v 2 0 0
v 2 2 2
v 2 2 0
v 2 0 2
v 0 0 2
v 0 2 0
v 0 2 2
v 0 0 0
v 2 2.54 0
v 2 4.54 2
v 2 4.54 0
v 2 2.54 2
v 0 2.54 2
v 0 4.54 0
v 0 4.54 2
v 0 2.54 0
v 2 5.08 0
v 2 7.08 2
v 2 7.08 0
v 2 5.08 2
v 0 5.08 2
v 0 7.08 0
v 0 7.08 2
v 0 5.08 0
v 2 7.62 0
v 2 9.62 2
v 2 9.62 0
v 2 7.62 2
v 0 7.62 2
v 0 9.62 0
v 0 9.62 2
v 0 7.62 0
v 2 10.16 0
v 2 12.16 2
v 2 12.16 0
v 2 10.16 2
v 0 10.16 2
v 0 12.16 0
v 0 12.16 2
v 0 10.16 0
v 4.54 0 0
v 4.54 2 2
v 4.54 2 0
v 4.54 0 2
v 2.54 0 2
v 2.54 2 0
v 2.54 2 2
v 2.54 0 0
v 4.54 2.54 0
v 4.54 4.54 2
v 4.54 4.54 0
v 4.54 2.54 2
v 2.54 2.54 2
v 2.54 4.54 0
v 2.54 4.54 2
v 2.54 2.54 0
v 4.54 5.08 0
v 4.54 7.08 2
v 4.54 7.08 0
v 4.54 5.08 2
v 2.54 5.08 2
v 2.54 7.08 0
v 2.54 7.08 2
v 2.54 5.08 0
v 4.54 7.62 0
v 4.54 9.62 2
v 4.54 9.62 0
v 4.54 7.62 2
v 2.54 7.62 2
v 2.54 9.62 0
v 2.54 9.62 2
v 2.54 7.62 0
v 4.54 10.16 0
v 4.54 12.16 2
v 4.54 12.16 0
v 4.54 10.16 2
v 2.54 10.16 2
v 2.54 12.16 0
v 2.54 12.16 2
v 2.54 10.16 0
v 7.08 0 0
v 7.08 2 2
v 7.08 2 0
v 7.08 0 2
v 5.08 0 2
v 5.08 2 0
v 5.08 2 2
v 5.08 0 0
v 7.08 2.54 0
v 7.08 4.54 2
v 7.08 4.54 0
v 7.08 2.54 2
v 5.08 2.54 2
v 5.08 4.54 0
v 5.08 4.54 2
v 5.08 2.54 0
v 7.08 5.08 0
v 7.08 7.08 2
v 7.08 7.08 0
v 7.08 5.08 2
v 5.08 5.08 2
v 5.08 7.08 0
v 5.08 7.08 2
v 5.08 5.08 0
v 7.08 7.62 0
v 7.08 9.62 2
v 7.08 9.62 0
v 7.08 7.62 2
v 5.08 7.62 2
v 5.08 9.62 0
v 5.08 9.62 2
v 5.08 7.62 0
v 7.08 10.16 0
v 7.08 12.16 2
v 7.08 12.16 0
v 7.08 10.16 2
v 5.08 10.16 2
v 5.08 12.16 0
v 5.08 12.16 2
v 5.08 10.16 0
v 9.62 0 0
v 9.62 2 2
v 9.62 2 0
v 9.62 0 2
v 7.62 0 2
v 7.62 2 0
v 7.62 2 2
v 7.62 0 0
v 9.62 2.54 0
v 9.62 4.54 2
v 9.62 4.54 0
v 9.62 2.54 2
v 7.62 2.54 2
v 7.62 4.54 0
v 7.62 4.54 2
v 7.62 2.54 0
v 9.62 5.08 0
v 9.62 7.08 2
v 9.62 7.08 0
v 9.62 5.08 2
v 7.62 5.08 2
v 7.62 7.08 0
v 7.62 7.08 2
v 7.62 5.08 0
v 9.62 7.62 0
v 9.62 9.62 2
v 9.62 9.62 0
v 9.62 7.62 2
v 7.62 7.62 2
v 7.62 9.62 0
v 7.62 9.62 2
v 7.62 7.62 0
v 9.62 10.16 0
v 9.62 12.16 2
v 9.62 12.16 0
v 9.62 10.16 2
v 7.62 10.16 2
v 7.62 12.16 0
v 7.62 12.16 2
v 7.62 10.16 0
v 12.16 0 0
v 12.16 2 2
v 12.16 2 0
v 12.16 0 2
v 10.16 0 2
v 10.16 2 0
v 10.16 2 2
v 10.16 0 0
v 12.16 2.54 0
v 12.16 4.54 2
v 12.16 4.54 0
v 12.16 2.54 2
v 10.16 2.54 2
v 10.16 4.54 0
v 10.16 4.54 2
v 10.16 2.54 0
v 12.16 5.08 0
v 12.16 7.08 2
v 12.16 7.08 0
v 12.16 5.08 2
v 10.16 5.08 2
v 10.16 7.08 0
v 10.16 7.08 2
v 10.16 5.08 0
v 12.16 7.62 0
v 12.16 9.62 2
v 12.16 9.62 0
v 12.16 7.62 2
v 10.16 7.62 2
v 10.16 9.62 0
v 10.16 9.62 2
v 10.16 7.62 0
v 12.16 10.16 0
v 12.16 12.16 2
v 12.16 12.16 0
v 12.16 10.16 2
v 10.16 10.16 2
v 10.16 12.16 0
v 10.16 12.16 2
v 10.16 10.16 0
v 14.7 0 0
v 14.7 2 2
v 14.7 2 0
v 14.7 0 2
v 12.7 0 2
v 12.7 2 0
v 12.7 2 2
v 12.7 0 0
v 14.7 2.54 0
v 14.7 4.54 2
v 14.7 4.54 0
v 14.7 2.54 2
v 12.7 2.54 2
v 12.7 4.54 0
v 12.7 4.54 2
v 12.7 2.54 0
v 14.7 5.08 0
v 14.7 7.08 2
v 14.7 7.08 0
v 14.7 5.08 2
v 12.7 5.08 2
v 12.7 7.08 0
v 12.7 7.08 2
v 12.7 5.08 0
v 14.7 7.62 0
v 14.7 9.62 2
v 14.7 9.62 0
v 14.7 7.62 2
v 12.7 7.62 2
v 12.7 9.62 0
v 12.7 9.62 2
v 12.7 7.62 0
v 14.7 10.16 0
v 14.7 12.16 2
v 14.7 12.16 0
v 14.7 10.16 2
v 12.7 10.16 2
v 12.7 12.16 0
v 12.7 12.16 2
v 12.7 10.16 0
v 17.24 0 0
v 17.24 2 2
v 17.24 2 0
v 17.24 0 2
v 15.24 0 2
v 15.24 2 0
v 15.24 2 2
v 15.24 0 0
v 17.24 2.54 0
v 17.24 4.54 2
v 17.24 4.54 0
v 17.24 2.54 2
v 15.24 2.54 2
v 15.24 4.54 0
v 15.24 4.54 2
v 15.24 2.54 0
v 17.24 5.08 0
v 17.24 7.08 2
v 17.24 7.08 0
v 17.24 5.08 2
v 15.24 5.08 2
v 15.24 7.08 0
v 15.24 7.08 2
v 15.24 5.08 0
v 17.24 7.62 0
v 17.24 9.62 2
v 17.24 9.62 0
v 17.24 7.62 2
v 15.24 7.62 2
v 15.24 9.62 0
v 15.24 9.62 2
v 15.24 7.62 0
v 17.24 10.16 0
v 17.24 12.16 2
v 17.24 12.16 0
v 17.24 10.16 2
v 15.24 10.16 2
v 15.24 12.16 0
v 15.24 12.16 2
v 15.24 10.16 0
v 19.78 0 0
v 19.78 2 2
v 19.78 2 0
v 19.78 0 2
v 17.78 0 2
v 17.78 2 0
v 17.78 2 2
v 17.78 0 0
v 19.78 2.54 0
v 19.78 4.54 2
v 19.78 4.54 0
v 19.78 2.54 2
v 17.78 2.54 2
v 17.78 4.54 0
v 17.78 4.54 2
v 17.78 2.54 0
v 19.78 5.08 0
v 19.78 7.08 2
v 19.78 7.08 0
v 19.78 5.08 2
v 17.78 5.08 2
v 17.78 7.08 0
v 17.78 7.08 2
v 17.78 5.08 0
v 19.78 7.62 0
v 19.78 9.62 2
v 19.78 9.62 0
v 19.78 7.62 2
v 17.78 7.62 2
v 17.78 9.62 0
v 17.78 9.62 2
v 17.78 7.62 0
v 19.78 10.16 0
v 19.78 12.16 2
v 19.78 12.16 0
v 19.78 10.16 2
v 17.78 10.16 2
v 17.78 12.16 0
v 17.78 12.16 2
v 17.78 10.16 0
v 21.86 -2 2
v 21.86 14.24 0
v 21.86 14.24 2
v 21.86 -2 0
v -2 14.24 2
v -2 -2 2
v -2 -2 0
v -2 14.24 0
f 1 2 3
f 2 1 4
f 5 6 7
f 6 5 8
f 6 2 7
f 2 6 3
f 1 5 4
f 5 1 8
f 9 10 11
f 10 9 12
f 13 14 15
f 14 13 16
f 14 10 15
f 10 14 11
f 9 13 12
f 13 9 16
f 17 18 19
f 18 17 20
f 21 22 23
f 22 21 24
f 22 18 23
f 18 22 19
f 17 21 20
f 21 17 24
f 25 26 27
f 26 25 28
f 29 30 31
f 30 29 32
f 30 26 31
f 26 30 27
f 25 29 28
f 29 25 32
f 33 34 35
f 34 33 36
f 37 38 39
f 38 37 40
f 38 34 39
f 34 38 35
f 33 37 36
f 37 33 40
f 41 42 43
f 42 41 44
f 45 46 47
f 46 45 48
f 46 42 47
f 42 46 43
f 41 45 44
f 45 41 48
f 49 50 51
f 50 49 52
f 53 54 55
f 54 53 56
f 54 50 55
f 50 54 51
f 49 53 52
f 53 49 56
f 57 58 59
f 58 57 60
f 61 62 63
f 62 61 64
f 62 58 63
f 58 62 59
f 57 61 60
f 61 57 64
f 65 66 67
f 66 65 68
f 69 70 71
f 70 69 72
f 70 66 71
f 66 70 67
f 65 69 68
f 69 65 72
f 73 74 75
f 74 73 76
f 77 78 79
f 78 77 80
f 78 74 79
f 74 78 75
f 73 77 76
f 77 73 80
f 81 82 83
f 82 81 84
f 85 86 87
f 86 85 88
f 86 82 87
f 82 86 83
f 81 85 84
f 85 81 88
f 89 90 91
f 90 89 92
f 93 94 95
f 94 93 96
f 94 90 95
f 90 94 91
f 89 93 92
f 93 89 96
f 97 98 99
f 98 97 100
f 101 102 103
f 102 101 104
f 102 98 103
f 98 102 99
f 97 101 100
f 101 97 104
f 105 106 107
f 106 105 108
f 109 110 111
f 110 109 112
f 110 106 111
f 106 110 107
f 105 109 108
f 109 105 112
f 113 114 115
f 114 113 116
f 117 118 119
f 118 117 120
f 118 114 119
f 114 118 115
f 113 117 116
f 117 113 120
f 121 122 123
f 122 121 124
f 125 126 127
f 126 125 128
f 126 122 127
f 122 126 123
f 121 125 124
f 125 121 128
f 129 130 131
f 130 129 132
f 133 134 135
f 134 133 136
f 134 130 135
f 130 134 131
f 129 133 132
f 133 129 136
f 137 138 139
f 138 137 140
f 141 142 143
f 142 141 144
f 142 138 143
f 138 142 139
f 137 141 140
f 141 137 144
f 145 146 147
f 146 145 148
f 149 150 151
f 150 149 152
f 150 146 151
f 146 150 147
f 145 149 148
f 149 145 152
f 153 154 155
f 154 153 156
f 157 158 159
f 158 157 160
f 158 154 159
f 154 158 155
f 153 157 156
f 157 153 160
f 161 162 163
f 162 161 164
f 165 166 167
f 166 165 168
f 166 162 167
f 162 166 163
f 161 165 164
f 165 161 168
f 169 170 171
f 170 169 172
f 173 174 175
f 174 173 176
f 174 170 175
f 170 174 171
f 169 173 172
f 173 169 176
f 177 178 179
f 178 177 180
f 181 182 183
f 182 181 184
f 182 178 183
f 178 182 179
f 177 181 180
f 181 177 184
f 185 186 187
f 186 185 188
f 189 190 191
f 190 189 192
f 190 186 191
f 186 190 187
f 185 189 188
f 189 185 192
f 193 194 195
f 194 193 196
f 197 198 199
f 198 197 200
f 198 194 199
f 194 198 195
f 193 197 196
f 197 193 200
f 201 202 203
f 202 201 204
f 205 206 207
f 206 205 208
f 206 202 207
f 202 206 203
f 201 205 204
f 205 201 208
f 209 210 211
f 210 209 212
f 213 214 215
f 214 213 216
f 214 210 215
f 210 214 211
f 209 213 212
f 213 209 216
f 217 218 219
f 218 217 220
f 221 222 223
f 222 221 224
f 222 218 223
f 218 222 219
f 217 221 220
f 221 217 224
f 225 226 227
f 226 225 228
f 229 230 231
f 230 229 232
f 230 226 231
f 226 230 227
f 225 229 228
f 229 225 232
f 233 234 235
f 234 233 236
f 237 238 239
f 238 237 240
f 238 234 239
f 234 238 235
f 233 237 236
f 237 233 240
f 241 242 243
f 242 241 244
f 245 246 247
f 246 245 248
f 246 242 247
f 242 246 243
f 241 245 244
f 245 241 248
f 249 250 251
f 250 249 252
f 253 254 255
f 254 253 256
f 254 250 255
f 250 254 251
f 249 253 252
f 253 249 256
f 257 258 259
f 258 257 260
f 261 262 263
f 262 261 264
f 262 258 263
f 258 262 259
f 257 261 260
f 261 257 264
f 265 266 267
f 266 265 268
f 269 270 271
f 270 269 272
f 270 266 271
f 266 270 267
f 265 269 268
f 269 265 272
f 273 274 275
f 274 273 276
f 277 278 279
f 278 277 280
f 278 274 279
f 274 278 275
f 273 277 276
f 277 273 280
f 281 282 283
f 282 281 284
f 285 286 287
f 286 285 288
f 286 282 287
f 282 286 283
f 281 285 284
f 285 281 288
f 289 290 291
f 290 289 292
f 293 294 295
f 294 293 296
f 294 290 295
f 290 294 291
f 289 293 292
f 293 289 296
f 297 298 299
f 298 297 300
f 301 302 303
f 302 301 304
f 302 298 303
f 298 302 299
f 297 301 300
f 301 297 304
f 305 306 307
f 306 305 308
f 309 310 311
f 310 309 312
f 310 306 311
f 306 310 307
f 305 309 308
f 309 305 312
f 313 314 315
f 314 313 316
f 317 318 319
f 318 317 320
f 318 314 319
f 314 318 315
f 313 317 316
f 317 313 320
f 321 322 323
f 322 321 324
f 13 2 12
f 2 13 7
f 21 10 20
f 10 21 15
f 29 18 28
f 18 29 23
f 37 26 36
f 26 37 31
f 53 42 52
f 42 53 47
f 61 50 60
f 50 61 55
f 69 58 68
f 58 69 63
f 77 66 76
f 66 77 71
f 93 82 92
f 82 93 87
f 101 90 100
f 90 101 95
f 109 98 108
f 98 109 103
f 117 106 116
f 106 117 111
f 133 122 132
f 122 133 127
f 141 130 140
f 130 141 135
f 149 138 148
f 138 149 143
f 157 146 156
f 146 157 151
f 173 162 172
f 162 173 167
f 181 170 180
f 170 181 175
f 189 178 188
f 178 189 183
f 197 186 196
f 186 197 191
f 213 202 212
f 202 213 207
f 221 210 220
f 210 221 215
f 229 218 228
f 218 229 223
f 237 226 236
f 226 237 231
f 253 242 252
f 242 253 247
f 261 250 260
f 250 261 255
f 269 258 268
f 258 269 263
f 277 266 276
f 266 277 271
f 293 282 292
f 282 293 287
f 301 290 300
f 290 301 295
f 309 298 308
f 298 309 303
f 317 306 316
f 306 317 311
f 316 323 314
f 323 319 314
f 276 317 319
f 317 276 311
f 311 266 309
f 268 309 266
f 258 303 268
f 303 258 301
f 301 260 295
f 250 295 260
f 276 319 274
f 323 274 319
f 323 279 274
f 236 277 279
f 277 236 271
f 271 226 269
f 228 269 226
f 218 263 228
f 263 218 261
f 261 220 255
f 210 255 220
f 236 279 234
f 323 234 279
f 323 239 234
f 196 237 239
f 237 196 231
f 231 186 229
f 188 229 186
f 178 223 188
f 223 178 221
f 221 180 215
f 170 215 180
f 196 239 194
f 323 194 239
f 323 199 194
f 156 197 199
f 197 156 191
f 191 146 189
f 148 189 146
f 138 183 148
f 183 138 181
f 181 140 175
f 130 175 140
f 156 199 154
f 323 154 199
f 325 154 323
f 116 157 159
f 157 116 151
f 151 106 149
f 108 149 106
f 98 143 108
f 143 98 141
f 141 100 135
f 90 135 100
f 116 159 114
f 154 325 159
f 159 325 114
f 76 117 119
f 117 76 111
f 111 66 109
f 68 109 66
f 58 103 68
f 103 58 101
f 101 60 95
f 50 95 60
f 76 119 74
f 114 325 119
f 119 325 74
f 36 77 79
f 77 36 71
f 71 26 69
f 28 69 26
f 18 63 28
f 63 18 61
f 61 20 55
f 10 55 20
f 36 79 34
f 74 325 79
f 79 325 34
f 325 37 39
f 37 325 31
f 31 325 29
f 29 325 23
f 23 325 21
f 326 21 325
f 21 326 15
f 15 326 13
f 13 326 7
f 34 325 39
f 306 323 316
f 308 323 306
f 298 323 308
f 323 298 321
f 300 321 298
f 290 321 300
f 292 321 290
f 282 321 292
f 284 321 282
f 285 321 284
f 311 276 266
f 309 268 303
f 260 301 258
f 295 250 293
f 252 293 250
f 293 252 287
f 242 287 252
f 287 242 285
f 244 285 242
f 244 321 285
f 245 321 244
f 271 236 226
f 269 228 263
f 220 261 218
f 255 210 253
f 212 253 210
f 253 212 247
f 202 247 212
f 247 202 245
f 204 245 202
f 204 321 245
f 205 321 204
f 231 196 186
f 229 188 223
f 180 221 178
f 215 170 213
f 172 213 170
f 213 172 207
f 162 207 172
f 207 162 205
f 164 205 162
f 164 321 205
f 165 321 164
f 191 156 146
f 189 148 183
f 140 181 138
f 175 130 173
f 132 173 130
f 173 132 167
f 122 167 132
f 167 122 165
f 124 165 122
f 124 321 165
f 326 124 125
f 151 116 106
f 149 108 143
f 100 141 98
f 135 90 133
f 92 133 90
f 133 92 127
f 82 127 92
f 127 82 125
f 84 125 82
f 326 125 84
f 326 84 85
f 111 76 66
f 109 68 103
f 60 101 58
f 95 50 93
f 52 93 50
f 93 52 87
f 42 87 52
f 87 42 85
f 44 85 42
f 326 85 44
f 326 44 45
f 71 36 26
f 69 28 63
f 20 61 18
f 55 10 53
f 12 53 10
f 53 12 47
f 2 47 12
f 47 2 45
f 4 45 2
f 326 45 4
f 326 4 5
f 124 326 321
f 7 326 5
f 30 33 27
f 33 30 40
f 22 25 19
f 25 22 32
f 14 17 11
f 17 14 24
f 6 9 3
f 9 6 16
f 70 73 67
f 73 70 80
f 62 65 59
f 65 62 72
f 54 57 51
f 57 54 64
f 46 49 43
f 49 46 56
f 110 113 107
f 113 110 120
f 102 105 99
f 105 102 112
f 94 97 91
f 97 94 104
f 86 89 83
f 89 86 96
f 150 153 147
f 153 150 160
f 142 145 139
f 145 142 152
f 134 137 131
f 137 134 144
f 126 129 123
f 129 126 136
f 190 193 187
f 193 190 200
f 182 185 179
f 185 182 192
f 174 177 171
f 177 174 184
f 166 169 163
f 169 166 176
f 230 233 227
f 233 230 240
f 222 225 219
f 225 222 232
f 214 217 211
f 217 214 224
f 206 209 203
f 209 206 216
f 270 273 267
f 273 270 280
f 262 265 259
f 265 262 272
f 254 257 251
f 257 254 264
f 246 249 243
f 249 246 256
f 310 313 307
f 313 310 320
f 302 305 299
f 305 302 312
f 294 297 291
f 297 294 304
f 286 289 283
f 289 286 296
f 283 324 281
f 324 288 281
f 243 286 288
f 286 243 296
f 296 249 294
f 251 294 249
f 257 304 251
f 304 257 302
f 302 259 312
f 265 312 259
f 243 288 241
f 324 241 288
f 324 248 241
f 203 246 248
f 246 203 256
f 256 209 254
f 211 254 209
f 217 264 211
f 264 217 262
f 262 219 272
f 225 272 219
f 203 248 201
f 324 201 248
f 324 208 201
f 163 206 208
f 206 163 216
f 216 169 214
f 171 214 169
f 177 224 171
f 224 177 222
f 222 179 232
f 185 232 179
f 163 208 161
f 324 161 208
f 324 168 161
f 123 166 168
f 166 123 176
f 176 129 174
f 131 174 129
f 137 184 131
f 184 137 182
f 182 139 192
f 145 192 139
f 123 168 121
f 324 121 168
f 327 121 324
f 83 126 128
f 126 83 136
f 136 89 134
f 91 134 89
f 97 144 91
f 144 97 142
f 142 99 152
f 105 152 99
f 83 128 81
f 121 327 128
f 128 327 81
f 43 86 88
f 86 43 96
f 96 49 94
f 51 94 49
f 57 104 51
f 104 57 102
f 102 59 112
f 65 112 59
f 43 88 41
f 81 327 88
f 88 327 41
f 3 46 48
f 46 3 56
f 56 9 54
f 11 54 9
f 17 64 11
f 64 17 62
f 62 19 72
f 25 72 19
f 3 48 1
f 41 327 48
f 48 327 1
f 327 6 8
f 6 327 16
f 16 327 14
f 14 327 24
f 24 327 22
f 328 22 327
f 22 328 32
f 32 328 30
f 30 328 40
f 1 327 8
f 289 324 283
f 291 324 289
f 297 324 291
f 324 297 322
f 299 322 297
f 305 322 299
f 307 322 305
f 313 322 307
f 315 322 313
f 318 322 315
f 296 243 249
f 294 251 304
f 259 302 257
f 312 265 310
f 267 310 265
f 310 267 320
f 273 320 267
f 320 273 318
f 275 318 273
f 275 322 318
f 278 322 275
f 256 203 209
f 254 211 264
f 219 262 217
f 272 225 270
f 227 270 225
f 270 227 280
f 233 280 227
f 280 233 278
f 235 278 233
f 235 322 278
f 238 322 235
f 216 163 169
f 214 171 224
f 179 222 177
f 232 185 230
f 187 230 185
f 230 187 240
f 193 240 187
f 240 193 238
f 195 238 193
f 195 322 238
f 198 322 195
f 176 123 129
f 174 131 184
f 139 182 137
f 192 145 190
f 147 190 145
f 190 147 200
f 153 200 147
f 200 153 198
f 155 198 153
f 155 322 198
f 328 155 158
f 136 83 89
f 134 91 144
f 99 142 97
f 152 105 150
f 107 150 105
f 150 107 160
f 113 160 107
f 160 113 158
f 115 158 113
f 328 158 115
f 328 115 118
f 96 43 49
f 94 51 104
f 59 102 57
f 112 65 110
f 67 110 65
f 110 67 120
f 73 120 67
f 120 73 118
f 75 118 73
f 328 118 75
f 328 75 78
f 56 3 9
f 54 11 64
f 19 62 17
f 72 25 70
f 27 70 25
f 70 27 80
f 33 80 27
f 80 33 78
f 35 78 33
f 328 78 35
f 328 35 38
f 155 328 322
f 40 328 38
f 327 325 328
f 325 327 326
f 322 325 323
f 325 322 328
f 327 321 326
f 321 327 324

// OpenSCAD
row = 8;
column = 5;
height = 2;


x = (row * 2.54) ;
y = (column * 2.54) ;


fen_x = ( x / 2.54 )  ; 
fen_y = ( y / 2.54 )  ; 


difference() {
    translate([-2,-2, 0]) {
    cube(size=[x+3.54, y+3.54, height]); }; //base cube
    
    for (i = [0:fen_x - 1]) {
      translate([i * 2.54, 0, 0])
        
      for (i = [0:fen_y - 1]) {
        translate([0, i * 2.54, -1])
          
        cube([2, 2, height+2]); //Cube - hole
      }
    }
  }
  
  
